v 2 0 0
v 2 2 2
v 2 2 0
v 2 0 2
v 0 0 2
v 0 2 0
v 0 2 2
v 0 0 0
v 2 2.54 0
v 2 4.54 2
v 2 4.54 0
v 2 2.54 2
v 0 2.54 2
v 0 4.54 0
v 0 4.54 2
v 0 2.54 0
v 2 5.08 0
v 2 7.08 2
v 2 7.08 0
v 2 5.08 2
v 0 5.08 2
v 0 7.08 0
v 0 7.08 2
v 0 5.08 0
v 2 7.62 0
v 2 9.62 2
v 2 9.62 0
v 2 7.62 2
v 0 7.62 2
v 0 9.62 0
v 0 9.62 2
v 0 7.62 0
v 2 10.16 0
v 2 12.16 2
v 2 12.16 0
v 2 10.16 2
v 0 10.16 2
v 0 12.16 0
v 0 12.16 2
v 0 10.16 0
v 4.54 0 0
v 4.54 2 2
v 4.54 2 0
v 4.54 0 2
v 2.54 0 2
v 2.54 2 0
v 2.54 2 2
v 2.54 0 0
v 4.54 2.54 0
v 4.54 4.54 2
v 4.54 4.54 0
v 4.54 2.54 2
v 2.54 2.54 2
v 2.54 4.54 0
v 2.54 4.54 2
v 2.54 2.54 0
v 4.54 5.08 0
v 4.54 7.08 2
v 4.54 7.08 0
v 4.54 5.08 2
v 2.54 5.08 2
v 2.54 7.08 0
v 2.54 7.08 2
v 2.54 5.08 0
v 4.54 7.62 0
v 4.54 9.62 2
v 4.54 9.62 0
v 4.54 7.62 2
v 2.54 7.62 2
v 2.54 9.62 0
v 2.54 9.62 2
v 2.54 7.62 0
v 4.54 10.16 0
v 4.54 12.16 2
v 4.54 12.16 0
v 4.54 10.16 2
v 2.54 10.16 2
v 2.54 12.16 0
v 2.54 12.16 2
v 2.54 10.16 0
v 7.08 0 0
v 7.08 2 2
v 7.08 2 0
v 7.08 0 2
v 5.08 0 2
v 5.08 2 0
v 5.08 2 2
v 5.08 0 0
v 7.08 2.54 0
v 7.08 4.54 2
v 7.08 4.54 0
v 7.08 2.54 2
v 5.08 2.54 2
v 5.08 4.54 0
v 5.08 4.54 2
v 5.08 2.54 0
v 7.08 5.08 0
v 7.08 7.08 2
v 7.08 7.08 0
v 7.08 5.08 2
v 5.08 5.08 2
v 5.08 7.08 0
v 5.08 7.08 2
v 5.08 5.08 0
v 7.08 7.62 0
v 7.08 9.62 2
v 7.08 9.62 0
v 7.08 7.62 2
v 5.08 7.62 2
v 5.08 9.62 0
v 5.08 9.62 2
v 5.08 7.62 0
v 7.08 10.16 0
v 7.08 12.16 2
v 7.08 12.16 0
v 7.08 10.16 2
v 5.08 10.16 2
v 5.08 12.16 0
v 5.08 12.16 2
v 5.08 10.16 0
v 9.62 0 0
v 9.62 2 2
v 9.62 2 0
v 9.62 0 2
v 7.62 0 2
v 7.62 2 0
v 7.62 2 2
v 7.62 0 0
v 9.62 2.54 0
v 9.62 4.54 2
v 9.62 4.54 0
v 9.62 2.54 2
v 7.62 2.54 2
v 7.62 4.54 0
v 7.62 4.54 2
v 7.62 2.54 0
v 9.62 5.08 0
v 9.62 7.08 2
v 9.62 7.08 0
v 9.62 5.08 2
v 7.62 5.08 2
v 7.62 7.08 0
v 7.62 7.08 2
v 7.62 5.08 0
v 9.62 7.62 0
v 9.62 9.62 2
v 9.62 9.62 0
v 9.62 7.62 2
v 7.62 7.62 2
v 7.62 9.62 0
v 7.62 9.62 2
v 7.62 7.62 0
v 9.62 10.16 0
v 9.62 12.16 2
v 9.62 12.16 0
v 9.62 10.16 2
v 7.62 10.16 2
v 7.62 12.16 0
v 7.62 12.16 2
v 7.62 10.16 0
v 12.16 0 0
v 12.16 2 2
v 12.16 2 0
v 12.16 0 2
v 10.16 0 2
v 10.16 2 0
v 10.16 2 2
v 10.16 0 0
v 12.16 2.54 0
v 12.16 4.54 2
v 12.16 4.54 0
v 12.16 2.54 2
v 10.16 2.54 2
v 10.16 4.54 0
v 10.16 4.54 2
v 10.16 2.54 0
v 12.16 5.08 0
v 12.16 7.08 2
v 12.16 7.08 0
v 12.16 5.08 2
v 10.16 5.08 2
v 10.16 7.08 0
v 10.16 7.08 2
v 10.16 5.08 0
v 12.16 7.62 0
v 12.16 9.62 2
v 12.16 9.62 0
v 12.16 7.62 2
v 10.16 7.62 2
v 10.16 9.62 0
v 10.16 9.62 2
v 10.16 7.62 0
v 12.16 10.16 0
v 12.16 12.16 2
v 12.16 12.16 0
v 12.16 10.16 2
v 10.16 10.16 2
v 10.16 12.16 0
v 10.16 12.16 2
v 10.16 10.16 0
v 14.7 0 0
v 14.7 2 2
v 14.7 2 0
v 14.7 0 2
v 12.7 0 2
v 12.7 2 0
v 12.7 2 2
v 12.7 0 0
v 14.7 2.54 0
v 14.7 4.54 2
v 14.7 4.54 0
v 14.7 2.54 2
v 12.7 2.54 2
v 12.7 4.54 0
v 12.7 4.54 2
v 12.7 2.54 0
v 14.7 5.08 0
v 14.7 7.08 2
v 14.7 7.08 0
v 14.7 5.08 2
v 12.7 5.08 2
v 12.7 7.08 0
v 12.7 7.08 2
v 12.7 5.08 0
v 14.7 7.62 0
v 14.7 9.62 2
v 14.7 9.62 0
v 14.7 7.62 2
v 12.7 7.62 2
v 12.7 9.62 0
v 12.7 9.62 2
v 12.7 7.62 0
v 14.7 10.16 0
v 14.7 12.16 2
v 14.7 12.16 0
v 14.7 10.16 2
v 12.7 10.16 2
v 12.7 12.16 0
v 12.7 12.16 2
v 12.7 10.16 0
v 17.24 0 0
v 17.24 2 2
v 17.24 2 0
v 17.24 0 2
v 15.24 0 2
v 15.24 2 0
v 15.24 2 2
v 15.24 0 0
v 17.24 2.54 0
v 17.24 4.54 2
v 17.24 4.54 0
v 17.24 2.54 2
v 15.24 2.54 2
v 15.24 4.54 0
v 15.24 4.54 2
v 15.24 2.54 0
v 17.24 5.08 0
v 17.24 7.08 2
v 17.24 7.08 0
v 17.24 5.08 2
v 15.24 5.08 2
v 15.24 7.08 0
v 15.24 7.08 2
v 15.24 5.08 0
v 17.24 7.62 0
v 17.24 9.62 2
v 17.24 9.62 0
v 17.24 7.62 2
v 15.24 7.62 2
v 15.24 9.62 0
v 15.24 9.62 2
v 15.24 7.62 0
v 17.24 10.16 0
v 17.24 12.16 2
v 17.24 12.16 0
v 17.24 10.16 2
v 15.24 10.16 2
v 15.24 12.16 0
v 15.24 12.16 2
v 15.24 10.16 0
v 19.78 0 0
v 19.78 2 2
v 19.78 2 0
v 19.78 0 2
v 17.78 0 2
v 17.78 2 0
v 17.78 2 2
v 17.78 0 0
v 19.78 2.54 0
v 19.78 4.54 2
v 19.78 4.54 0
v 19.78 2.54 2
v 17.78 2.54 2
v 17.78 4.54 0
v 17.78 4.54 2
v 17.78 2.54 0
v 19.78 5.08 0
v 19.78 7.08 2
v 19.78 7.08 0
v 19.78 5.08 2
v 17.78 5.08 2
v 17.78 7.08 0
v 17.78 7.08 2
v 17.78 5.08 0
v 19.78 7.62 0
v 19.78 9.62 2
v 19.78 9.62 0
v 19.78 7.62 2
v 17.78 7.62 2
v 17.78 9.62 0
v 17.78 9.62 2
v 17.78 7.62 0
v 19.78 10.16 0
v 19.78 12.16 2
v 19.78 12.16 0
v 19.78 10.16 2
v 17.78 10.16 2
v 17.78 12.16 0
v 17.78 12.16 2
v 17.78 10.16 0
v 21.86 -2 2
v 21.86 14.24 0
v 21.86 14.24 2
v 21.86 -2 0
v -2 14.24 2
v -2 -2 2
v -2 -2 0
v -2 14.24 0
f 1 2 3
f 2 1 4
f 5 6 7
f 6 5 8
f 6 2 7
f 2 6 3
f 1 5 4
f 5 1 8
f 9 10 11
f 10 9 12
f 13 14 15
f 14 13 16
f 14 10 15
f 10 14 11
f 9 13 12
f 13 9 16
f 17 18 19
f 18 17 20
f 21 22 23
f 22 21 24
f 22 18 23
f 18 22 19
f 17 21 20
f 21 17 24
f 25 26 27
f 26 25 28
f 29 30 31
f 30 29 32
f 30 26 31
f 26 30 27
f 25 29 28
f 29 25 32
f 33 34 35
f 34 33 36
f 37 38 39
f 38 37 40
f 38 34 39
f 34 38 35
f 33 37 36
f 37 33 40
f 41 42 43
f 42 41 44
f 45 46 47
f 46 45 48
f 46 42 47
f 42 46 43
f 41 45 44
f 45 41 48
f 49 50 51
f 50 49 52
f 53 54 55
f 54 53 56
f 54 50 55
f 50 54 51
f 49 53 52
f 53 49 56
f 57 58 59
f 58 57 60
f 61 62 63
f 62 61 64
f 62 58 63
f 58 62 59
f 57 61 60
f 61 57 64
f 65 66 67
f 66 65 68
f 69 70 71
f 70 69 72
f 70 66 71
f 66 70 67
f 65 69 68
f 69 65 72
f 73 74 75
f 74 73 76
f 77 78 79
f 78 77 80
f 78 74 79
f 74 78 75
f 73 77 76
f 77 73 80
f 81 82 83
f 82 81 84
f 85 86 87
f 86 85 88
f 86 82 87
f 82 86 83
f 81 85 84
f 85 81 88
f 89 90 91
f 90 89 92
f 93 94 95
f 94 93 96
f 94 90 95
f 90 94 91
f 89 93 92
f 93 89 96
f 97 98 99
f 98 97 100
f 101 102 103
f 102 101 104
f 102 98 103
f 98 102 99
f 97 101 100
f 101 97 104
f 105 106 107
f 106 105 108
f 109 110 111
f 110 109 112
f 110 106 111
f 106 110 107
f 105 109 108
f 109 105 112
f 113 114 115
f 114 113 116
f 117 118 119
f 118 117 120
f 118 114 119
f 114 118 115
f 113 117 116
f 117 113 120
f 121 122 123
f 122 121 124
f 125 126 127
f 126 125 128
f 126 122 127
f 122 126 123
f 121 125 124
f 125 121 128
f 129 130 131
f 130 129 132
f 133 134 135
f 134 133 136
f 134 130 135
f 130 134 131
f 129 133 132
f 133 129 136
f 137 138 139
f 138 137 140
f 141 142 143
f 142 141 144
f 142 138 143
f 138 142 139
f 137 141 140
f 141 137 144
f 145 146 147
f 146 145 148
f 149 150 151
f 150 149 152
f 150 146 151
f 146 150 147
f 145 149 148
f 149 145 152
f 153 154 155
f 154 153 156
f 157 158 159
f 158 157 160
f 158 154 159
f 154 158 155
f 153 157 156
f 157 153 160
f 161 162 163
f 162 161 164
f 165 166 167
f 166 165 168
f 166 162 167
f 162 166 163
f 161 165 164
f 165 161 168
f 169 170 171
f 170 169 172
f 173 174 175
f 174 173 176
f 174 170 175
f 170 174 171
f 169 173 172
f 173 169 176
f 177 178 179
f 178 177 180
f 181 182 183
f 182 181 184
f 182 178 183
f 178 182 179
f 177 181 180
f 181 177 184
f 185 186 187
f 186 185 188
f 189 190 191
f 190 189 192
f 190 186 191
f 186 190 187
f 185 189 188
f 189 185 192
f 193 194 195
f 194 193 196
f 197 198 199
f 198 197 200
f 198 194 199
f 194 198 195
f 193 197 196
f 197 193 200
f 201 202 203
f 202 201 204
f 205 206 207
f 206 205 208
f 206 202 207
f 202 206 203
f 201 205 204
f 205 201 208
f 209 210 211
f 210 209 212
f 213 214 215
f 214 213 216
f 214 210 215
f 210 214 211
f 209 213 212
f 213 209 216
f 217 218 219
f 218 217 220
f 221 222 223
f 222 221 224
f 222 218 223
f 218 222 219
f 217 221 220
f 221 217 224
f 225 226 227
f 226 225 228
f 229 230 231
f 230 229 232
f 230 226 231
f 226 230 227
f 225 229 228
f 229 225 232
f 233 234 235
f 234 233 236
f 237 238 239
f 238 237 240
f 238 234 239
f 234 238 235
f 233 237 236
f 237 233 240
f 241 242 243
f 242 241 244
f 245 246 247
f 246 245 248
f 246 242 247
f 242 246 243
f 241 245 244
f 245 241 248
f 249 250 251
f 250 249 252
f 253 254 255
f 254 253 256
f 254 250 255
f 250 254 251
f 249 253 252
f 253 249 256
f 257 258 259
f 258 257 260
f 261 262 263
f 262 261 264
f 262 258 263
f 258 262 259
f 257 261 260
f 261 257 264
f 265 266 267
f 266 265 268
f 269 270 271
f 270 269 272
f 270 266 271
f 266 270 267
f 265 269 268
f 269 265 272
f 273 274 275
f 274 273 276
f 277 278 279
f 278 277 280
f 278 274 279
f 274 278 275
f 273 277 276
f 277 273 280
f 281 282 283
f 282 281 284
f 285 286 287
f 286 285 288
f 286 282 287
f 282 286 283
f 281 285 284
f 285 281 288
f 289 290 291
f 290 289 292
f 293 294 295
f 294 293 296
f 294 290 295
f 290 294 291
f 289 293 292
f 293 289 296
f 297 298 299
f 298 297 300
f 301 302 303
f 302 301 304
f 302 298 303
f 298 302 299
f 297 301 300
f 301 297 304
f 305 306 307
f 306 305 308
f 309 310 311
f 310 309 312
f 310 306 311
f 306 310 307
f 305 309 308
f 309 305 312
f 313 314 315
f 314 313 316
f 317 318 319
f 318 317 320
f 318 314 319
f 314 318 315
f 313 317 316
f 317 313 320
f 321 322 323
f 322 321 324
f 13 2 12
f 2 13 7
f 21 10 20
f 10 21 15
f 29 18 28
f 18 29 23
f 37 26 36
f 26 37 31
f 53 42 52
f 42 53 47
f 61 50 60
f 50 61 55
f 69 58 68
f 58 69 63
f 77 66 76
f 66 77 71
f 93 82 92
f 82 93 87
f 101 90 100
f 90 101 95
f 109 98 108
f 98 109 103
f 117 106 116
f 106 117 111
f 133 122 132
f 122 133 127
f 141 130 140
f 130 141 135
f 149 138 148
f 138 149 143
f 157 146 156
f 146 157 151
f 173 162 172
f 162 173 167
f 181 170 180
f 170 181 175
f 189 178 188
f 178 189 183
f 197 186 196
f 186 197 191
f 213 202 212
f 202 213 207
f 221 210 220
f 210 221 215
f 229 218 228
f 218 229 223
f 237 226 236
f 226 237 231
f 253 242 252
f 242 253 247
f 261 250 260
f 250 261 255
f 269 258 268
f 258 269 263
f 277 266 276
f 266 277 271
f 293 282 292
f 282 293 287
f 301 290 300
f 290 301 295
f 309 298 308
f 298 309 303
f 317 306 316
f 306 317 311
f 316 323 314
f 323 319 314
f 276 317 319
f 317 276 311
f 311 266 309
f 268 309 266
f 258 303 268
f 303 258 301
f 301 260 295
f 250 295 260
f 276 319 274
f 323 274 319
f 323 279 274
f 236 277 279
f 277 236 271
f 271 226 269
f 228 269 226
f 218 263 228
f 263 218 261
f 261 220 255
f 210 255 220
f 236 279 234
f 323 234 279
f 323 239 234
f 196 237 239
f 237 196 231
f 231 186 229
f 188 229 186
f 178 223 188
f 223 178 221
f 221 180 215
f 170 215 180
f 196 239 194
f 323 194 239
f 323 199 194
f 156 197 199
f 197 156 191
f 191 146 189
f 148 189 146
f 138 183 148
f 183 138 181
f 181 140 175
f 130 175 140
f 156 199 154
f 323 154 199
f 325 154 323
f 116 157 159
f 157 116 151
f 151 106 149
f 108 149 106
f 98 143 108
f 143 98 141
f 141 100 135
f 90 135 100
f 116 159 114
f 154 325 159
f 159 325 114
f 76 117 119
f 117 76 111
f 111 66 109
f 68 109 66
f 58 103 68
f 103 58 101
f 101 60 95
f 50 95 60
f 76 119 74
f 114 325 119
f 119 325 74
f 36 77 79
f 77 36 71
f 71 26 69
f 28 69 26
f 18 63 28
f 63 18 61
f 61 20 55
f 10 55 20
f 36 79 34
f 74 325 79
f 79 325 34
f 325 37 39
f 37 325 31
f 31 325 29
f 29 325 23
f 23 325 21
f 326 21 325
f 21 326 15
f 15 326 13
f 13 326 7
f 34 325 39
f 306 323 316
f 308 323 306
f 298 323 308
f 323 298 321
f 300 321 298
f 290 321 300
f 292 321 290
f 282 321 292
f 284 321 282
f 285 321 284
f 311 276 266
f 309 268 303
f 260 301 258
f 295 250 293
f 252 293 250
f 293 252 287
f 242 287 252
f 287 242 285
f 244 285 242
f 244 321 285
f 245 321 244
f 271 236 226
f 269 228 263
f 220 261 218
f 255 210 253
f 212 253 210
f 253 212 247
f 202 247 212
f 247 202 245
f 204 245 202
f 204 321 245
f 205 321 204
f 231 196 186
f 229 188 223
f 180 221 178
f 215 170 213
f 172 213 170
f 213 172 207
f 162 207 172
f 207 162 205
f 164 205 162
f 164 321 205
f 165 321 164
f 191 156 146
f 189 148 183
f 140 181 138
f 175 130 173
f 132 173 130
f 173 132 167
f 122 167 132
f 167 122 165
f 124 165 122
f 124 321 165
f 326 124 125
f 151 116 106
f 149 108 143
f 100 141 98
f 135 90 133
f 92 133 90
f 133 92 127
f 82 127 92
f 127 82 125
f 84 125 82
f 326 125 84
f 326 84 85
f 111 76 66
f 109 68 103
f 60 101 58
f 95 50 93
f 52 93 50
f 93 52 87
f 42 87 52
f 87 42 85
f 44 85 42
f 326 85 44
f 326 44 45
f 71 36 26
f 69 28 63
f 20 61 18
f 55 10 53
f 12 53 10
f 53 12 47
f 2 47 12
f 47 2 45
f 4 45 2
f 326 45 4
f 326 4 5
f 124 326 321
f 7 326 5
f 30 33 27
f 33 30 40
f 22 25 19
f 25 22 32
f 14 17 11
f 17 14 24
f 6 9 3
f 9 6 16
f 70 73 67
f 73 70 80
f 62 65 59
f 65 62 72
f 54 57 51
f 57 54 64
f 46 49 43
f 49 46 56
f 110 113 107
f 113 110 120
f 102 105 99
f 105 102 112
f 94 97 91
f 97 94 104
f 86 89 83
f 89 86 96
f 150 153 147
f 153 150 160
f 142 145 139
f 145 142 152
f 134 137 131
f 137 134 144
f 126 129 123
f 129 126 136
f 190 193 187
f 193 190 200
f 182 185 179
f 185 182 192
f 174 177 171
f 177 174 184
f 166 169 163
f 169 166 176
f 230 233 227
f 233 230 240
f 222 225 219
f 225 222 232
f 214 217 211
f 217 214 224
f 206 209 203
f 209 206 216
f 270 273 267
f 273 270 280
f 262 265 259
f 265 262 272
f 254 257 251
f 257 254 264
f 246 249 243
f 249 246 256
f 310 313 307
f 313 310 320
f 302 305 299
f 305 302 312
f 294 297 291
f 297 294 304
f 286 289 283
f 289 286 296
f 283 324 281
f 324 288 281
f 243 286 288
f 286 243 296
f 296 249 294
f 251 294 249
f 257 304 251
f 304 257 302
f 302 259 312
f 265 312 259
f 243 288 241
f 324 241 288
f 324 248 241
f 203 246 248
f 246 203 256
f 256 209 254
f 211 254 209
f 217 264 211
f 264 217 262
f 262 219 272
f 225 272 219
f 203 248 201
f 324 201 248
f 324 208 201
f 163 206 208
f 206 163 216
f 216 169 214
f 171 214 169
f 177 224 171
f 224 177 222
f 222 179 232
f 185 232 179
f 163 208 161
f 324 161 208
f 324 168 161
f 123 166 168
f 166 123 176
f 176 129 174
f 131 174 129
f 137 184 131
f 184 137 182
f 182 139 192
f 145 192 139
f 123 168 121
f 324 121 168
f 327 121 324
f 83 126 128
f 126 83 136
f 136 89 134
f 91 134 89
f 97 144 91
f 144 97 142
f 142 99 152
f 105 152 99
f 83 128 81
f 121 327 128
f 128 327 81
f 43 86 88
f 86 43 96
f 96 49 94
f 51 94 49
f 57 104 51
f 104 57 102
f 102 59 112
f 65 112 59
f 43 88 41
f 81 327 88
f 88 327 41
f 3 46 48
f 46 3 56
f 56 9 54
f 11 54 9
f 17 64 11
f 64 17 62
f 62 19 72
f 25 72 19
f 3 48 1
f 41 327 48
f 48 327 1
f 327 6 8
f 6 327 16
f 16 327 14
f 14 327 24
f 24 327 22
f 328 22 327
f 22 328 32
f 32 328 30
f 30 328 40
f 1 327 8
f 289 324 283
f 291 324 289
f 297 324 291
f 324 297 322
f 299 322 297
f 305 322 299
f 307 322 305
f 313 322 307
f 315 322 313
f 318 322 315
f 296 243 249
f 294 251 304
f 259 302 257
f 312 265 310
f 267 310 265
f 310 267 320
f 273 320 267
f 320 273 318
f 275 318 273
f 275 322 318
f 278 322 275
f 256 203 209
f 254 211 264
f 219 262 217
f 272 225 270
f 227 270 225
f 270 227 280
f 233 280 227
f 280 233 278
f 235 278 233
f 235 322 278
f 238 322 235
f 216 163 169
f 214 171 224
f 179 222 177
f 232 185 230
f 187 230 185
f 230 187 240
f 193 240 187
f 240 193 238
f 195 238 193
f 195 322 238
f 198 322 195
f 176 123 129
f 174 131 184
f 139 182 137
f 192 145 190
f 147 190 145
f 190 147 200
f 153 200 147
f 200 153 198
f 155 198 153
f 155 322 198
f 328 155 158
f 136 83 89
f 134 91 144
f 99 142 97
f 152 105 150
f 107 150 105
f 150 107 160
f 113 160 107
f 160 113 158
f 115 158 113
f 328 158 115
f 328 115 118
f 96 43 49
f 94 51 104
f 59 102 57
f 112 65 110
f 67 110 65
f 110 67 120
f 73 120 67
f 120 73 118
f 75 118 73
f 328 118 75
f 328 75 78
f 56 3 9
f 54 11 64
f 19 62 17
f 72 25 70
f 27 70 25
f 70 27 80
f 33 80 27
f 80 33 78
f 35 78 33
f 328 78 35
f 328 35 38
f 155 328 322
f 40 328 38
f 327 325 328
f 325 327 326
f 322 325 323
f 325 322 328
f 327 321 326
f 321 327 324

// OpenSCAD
row = 8;
column = 5;
height = 2;


x = (row * 2.54) ;
y = (column * 2.54) ;


fen_x = ( x / 2.54 )  ; 
fen_y = ( y / 2.54 )  ; 


difference() {
    translate([-2,-2, 0]) {
    cube(size=[x+3.54, y+3.54, height]); }; //base cube
    
    for (i = [0:fen_x - 1]) {
      translate([i * 2.54, 0, 0])
        
      for (i = [0:fen_y - 1]) {
        translate([0, i * 2.54, -1])
          
        cube([2, 2, height+2]); //Cube - hole
      }
    }
  }
  
  
